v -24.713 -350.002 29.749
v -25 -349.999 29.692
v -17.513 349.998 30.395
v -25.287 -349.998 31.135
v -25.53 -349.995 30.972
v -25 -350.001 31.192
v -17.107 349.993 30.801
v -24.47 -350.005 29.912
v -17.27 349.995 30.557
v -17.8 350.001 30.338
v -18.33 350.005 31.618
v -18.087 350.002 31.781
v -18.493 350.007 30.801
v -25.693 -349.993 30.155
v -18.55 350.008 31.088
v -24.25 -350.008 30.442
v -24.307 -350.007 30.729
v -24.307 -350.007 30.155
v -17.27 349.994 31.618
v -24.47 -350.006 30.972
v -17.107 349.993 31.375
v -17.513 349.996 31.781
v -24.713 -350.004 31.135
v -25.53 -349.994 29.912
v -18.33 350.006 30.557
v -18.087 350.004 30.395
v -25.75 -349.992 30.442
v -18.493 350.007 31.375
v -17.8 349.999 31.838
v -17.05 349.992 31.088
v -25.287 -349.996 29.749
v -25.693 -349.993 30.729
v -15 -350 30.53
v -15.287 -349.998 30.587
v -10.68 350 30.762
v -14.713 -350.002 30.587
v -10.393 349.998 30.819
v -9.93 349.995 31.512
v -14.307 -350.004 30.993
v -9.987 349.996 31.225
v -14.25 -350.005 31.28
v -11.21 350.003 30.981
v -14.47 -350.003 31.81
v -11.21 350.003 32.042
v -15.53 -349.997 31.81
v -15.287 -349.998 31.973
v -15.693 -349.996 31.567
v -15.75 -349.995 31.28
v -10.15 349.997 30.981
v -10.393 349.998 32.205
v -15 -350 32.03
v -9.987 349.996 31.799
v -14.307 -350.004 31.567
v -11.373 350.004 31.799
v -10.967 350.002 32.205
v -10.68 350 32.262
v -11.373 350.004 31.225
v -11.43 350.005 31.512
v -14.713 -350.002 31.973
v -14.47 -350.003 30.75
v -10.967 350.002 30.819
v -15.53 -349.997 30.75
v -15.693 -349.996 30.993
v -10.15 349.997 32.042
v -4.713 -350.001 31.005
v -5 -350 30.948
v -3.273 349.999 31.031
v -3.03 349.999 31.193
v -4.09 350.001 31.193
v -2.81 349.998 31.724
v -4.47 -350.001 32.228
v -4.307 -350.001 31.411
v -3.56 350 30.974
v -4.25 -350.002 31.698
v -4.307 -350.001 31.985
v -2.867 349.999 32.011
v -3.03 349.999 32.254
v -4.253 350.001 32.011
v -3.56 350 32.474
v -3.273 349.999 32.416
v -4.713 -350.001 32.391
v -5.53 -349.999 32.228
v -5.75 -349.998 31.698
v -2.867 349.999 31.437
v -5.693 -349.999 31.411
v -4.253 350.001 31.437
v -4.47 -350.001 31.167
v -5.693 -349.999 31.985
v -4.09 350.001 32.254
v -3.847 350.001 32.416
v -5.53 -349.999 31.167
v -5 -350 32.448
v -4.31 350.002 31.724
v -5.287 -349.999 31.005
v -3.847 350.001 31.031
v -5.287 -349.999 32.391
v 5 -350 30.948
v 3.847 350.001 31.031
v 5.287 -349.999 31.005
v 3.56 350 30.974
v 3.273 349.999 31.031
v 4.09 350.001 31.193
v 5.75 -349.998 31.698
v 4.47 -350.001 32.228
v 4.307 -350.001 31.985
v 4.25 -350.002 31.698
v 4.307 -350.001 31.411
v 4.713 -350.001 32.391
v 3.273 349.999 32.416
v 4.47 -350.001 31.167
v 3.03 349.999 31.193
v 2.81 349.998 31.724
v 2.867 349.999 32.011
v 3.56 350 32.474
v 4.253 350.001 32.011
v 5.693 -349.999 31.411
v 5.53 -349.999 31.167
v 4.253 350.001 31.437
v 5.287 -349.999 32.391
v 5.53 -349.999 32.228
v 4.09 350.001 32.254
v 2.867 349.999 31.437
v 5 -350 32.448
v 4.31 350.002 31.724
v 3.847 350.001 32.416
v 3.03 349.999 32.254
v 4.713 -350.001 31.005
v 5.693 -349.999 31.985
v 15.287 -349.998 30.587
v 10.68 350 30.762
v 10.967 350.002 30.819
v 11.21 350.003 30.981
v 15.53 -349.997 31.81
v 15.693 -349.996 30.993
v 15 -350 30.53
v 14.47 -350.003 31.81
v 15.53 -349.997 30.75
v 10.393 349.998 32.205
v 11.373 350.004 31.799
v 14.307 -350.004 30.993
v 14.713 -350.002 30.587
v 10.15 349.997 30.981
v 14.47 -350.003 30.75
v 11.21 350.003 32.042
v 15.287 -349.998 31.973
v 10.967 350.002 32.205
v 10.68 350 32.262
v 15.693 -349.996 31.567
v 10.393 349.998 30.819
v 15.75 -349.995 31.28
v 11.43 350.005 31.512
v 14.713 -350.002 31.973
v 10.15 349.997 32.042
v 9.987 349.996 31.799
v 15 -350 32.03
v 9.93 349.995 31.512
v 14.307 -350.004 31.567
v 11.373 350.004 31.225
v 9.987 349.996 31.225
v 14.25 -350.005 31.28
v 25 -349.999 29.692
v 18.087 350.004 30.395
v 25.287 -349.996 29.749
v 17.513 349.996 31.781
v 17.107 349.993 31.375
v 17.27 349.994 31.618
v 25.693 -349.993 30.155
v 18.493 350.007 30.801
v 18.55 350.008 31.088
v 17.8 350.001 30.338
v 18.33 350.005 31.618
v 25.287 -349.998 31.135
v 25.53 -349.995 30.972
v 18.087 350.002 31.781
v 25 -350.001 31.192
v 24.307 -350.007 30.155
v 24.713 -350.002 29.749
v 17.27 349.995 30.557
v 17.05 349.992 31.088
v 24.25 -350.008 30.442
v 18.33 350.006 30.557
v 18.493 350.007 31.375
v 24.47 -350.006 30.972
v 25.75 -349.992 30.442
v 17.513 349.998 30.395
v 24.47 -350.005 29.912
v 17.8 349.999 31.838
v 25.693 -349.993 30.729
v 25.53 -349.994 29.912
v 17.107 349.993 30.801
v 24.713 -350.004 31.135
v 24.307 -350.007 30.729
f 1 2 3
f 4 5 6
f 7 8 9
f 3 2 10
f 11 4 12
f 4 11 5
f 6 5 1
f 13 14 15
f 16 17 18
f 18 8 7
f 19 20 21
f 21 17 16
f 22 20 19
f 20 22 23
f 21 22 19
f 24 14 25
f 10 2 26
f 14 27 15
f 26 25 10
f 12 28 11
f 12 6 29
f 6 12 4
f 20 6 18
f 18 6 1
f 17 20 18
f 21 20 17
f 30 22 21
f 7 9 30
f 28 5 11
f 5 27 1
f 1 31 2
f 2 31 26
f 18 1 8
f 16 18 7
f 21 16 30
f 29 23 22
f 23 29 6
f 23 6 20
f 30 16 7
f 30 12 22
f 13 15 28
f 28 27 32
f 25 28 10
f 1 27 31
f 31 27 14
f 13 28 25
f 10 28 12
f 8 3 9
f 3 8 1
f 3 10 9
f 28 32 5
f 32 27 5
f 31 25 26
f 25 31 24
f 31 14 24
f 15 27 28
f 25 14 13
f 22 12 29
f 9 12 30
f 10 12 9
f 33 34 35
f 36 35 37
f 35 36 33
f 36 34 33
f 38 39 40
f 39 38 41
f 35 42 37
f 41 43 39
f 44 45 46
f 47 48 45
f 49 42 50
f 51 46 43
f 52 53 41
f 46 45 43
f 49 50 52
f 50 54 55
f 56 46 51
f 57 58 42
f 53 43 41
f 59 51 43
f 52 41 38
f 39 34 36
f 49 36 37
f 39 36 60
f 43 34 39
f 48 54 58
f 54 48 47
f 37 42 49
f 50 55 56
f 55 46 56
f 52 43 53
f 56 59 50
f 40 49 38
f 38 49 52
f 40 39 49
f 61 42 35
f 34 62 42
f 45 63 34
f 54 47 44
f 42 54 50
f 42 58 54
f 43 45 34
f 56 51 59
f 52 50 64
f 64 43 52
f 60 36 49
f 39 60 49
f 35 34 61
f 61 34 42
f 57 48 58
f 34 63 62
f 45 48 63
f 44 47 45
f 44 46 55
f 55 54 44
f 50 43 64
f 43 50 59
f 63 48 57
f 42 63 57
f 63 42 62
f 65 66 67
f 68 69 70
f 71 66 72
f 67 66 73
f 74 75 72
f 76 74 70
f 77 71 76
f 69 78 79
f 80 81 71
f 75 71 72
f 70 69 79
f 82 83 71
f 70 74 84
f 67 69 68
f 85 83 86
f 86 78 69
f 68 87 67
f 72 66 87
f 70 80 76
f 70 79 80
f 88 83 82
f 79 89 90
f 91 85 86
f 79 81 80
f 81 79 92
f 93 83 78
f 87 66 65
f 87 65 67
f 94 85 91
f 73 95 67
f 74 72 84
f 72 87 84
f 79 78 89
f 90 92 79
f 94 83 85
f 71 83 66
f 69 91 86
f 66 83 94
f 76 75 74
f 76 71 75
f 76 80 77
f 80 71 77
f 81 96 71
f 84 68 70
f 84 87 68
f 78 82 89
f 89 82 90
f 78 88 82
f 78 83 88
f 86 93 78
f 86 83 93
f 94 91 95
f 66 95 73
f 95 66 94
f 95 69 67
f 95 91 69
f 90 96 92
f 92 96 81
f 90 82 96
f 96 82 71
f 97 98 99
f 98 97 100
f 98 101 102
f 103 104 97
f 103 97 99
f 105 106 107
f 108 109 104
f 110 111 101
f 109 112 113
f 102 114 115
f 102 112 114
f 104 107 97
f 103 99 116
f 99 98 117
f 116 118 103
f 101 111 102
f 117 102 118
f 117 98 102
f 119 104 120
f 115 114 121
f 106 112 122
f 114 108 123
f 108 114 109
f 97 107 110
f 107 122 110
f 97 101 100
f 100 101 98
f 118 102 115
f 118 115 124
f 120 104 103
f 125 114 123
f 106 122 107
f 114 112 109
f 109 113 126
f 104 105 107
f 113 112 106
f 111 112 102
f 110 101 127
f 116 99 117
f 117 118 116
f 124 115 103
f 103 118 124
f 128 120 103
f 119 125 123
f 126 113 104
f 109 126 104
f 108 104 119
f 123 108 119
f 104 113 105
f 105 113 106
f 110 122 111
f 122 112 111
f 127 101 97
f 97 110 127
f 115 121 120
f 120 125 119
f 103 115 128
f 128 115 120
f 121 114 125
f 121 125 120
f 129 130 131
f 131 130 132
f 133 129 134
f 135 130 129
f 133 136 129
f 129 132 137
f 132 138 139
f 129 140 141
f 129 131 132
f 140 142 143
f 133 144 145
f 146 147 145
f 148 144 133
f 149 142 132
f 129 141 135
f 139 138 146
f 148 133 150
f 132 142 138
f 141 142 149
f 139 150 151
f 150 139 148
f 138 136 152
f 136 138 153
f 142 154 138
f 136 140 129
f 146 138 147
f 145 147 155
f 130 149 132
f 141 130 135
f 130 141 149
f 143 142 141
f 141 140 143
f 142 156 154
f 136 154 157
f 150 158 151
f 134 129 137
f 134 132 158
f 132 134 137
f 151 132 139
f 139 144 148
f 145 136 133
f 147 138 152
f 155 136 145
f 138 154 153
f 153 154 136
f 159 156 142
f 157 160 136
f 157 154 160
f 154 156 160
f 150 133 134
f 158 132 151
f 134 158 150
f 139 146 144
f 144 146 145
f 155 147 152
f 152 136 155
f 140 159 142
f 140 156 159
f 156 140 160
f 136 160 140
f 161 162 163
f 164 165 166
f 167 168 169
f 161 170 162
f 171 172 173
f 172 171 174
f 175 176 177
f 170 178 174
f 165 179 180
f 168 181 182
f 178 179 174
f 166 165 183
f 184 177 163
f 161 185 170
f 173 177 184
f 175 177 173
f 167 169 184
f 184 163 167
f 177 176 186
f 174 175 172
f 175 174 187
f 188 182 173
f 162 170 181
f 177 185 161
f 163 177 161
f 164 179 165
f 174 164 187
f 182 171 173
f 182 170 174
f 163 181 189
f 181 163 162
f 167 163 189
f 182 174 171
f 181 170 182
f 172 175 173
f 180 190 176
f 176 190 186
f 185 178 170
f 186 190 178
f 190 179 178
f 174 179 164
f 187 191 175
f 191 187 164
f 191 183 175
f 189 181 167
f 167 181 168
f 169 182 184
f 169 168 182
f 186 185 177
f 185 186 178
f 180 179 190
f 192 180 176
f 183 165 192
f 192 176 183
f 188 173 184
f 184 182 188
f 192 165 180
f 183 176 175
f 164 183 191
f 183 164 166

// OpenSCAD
// file: ../../../utilities/distance_3d.scad
/**
 * Calculates the distance between two points in 3D space, in millimeters.
 * @param from_mm     An array containing the X, Y and Z of the first point to
 *                    measure, in millimeters.
 * @param to_mm       An array containing the X, Y and Z of the second point to
 *                    measure, in millimeters.
 * @return            The distance between the two given points, in millimeters.
 */
function distance_3d(from_mm, to_mm) =
  let(difference_mm = to_mm - from_mm)
  sqrt(pow(difference_mm[0], 2) + pow(difference_mm[1], 2) + pow(difference_mm[2], 2));
// file: ../../calculations/fretboard.scad
/**
 * Calculates the angle of a point on the X axis around the origin of the
 * fretboard radius.
 * @param fretboard_radius_mm The radius of the fretboard, in millimeters.
 * @param x_mm                The point to sample on the X axis, in millimeters.
 * @return                    The angle of the given point on the X axis around
 *                            the origin of the fretboard radius.
 */
function degrees_around_fretboard_radius_origin(fretboard_radius_mm, x_mm) = asin(x_mm / fretboard_radius_mm);

/**
 * Calculates the Z position of a point on the X axis around the origin of the
 * fretboard radius, in millimeters.
 * @param fretboard_radius_mm The radius of the fretboard, in millimeters.
 * @param radius_offset_mm    An offset above the fretboard, in millimeters.
 * @param body_thickness_mm   The thickness of the body, in millimeters.
 * @param x_mm                The point to sample on the X axis, in millimeters.
 * @return                    The angle of the given point on the X axis around
 *                            the origin of the fretboard radius.
 */
function z_mm_over_fretboard_radius_origin(fretboard_radius_mm, radius_offset_mm, body_thickness_mm, x_mm) = cos(degrees_around_fretboard_radius_origin(fretboard_radius_mm, x_mm)) * (fretboard_radius_mm + radius_offset_mm) + body_thickness_mm - fretboard_radius_mm;

/**
 * Generates an array of 2D points representing a cross section of the neck,
 * running clockwise.
 * @param fretboard_radius_mm The radius of the fretboard, in millimeters.
 * @param fretboard_sides     The number of sides of the fretboard.
 * @param neck_width_mm       The width of the neck at the cross section.
 * @param body_thickness_mm   The thickness of the body, in millimeters.
 * @param include_corners     When true, the first and final vertices (common
 *                            with the neck cross section) will be included.
 *                            They will otherwise be ommitted.
 * @return                    An array of 2D points representing a cross section
 *                            of the fretboard, running clockwise.
 */
function fretboard_cross_section(
  fretboard_radius_mm,
  fretboard_sides,
  neck_width_mm,
  body_thickness_mm,
  include_corners
) = [
  for (point_index = [
    include_corners ? 0 : 1 : fretboard_sides - (include_corners ? 0 : 1)
  ]) let (x_mm = ((point_index / fretboard_sides) - 0.5) * neck_width_mm) [
    x_mm,
    z_mm_over_fretboard_radius_origin(fretboard_radius_mm, 0, body_thickness_mm, x_mm),
  ]
];
// file: ../../../utilities/linear_interpolate.scad
/**
 * Linearly interpolates between two values, extrapolating if out of range.
 * @param from  The value to interpolate from.
 * @param to    The value to interpolate to.
 * @param alpha The value to interpolate by, where:
 *              - less than 0                 = extrapolate beyond the "from"
 *                                              value.
 *              - 0                           = the "from" value.
 *              - greater than 0, less than 1 = interpolate between the "from"
 *                                              and "to" values.
 *              - 1                           = the "to" value.
 *              - greater than 1              = extrapolate beyond the "to"
 *                                              value.
 * @return      A linear interpolation between the two values, extrapolating if
 *              out of range.
 */
function linear_interpolate(from, to, alpha) = from + (to - from) * alpha;
// file: ../../../utilities/line_3d.scad
use <distance_3d.scad>;

/**
 * Draws a 3D line between two points.
 * @param from_mm     An array containing the X, Y and Z of the first point to
 *                    join, in millimeters.
 * @param to_mm       An array containing the X, Y and Z of the second point to
 *                    join, in millimeters.
 * @param diameter_mm The diameter of the 3D line, in millimeters.
 * @param sides       The number of sides of the 3D line.
 */
module line_3d(from_mm, to_mm, diameter_mm, sides) {
  difference_mm = to_mm - from_mm;
  distance_mm = distance_3d(from_mm, to_mm);

  translate(from_mm) {
    rotate([
      0,
      acos(difference_mm[2] / distance_mm),
      atan2(difference_mm[1], difference_mm[0]),
    ]) {
      cylinder(d = diameter_mm, h = distance_mm, $fn = sides);
    };
  };
};
// file: ../../calculations/fret.scad
/**
 * Calculates the position of the center of a fret on the Y axis.
 * @param scale_length_mm The distance between the middle of the zero fret and
 *                        the middle of the bridge fret.
 * @param fret_index      The number of the fret.
 * @return                The position of the center of the fret on the Y axis.
 */
function fret_y_mm(scale_length_mm, fret_index) = scale_length_mm / -2 + (scale_length_mm / pow(2, fret_index / 12));

/**
 * Calculates the position of the center of the bridge fret on the Y axis.
 * @param scale_length_mm The distance between the middle of the zero fret and
 *                        the middle of the bridge fret.
 * @return                The position of the center of the bridge fret on the Y
 *                        axis.
 */
function fret_bridge_y_mm(scale_length_mm) = scale_length_mm / -2;
// file: ../../calculations/string.scad
use <../../utilities/linear_interpolate.scad>;
use <fret.scad>;
use <fretboard.scad>;

/**
  * Calculates the position of a string on the X axis in millimeters.
  * @param y_mm                    The position at which the string is being
  *                                sampled on the Y axis, in millimeters.
  * @param string_index            The string number, where 0 is the leftmost.
  * @param string_count            The number of strings.
  * @param scale_length_mm         The distance between the middle of the zero
  *                                fret and the middle of the bridge fret, in
  *                                millimeters.
  * @param string_spread_zero_mm   The distance between the highest and lowest
  *                                strings at the zero fret, in millimeters.
  * @param string_spread_bridge_mm The distance between the highest and lowest
  *                                strings at the bridge fret, in millimeters.
  * @return                        The position of the string on the X axis in
  *                                millimeters.
  */
function string_x_mm(
  y_mm,
  string_index,
  string_count,
  scale_length_mm,
  string_spread_zero_mm,
  string_spread_bridge_mm,
) = linear_interpolate(
  string_spread_zero_mm,
  string_spread_bridge_mm,
  min(1, max(0, (y_mm - fret_y_mm(scale_length_mm, 0)) / (fret_bridge_y_mm(scale_length_mm) - fret_y_mm(scale_length_mm, 0))))
) * ((string_index / (string_count - 1)) - 0.5);

/**
 * @param y_mm                           The position at which the string is
 *                                       being sampled on the Y axis, in
 *                                       millimeters.
 * @param string_index                   The string number, where 0 is the
                                         leftmost.
 * @param string_count                   The number of strings.
 * @param scale_length_mm                The distance between the middle of the
 *                                       zero fret and the middle of the bridge
 *                                       fret, in millimeters.
 * @param string_spread_zero_mm          The distance between the highest and
 *                                       lowest strings at the zero fret, in
 *                                       millimeters.
 * @param string_spread_bridge_mm        The distance between the highest and
 *                                       lowest strings at the bridge fret, in
 *                                       millimeters.
 * @param fretboard_radius_mm            The radius of the fretboard, in
 *                                       millimeters.
 * @param fret_zero_and_bridge_offset_mm The vertical offset of the bridge and
 *                                       nut frets relative to all other frets
 *                                       (the string height/action), in
 *                                       millimeters.
 * @param string_diameter_mm             The diameter of a string, in
 *                                       millimeters.
 * @param body_thickness_mm              The thickness of the body, in
 *                                       millimeters.
 * @return
 */
function string_z_mm(
  y_mm,
  string_index,
  string_count,
  scale_length_mm,
  string_spread_zero_mm,
  string_spread_bridge_mm,
  fretboard_radius_mm,
  fret_zero_and_bridge_offset_mm,
  string_diameter_mm,
  body_thickness_mm,
) = z_mm_over_fretboard_radius_origin(
  fretboard_radius_mm,
  fret_zero_and_bridge_offset_mm + string_diameter_mm / 2,
  body_thickness_mm,
  string_x_mm(
    y_mm,
    string_index,
    string_count,
    scale_length_mm,
    string_spread_zero_mm,
    string_spread_bridge_mm
  )
);
// file: ../../measurements/body.scad
// The thickness of the body, in millimeters.
body_thickness_mm = 30;
// file: ../../measurements/fretboard.scad
// The radius of the fretboard, in millimeters.
fretboard_radius_mm = 241.3;

// The number of sides of the fretboard.
fretboard_sides = 36;
// file: ../../measurements/fret.scad
// The thickness of frets (along the neck), in millimeters.
fret_thickness_mm = 2.62;

// The height of frets (how far they stick out of the fretboard), in millimeters.
fret_height_mm = 1.2;

// The vertical offset of the bridge and nut frets relative to all other frets (the string height/action), in millimeters.
fret_zero_and_bridge_offset_mm = 1;

// The number of (non-zero or bridge) frets.
fret_count = 16;

// The distance between the middle of the zero fret and the middle of the bridge fret, in millimeters.
scale_length_mm = 700;
// file: ../../measurements/string.scad
// The diameter of a string, in millimeters.
string_diameter_mm = 1.5;

// The number of sides of a string.
string_sides = 16;

// The diameter of an apeture for a string, in millimeters.
string_apeture_diameter_mm = 2;

// The distance between the highest and lowest strings at the zero fret, in millimeters.
string_spread_zero_mm = 35.6;

// The distance between the highest and lowest strings at the bridge fret, in millimeters.
string_spread_bridge_mm = 50;

// The diameter of a string's ball, in millimeters.
string_ball_diameter_mm = 4;

// The diameter of a cavity for a string's ball, in millimeters.
string_ball_cavity_diameter_mm = 5;

// The number of sides of a string's ball.
string_ball_diameter_sides = 36;

// The number of strings.
string_count = 6;
// main file
include <../../measurements/string.scad>;
include <../../measurements/fret.scad>;
include <../../measurements/fretboard.scad>;
include <../../measurements/body.scad>;
use <../../calculations/string.scad>;
use <../../calculations/fret.scad>;
use <../../../utilities/line_3d.scad>;

for (string_index = [0 : string_count - 1]) {
  zero_y_mm = fret_y_mm(scale_length_mm, 0);
  bridge_y_mm = fret_bridge_y_mm(scale_length_mm);

  line_3d(
    [
      string_x_mm(
        zero_y_mm,
        string_index,
        string_count,
        scale_length_mm,
        string_spread_zero_mm,
        string_spread_bridge_mm
      ),
      zero_y_mm,
      string_z_mm(
        zero_y_mm,
        string_index,
        string_count,
        scale_length_mm,
        string_spread_zero_mm,
        string_spread_bridge_mm,
        fretboard_radius_mm,
        fret_zero_and_bridge_offset_mm,
        string_diameter_mm,
        body_thickness_mm
      ),
    ],
    [
      string_x_mm(
        bridge_y_mm,
        string_index,
        string_count,
        scale_length_mm,
        string_spread_zero_mm,
        string_spread_bridge_mm
      ),
      bridge_y_mm,
      string_z_mm(
        bridge_y_mm,
        string_index,
        string_count,
        scale_length_mm,
        string_spread_zero_mm,
        string_spread_bridge_mm,
        fretboard_radius_mm,
        fret_zero_and_bridge_offset_mm,
        string_diameter_mm,
        body_thickness_mm
      ),
    ],
    string_diameter_mm,
    string_sides
  );
};
